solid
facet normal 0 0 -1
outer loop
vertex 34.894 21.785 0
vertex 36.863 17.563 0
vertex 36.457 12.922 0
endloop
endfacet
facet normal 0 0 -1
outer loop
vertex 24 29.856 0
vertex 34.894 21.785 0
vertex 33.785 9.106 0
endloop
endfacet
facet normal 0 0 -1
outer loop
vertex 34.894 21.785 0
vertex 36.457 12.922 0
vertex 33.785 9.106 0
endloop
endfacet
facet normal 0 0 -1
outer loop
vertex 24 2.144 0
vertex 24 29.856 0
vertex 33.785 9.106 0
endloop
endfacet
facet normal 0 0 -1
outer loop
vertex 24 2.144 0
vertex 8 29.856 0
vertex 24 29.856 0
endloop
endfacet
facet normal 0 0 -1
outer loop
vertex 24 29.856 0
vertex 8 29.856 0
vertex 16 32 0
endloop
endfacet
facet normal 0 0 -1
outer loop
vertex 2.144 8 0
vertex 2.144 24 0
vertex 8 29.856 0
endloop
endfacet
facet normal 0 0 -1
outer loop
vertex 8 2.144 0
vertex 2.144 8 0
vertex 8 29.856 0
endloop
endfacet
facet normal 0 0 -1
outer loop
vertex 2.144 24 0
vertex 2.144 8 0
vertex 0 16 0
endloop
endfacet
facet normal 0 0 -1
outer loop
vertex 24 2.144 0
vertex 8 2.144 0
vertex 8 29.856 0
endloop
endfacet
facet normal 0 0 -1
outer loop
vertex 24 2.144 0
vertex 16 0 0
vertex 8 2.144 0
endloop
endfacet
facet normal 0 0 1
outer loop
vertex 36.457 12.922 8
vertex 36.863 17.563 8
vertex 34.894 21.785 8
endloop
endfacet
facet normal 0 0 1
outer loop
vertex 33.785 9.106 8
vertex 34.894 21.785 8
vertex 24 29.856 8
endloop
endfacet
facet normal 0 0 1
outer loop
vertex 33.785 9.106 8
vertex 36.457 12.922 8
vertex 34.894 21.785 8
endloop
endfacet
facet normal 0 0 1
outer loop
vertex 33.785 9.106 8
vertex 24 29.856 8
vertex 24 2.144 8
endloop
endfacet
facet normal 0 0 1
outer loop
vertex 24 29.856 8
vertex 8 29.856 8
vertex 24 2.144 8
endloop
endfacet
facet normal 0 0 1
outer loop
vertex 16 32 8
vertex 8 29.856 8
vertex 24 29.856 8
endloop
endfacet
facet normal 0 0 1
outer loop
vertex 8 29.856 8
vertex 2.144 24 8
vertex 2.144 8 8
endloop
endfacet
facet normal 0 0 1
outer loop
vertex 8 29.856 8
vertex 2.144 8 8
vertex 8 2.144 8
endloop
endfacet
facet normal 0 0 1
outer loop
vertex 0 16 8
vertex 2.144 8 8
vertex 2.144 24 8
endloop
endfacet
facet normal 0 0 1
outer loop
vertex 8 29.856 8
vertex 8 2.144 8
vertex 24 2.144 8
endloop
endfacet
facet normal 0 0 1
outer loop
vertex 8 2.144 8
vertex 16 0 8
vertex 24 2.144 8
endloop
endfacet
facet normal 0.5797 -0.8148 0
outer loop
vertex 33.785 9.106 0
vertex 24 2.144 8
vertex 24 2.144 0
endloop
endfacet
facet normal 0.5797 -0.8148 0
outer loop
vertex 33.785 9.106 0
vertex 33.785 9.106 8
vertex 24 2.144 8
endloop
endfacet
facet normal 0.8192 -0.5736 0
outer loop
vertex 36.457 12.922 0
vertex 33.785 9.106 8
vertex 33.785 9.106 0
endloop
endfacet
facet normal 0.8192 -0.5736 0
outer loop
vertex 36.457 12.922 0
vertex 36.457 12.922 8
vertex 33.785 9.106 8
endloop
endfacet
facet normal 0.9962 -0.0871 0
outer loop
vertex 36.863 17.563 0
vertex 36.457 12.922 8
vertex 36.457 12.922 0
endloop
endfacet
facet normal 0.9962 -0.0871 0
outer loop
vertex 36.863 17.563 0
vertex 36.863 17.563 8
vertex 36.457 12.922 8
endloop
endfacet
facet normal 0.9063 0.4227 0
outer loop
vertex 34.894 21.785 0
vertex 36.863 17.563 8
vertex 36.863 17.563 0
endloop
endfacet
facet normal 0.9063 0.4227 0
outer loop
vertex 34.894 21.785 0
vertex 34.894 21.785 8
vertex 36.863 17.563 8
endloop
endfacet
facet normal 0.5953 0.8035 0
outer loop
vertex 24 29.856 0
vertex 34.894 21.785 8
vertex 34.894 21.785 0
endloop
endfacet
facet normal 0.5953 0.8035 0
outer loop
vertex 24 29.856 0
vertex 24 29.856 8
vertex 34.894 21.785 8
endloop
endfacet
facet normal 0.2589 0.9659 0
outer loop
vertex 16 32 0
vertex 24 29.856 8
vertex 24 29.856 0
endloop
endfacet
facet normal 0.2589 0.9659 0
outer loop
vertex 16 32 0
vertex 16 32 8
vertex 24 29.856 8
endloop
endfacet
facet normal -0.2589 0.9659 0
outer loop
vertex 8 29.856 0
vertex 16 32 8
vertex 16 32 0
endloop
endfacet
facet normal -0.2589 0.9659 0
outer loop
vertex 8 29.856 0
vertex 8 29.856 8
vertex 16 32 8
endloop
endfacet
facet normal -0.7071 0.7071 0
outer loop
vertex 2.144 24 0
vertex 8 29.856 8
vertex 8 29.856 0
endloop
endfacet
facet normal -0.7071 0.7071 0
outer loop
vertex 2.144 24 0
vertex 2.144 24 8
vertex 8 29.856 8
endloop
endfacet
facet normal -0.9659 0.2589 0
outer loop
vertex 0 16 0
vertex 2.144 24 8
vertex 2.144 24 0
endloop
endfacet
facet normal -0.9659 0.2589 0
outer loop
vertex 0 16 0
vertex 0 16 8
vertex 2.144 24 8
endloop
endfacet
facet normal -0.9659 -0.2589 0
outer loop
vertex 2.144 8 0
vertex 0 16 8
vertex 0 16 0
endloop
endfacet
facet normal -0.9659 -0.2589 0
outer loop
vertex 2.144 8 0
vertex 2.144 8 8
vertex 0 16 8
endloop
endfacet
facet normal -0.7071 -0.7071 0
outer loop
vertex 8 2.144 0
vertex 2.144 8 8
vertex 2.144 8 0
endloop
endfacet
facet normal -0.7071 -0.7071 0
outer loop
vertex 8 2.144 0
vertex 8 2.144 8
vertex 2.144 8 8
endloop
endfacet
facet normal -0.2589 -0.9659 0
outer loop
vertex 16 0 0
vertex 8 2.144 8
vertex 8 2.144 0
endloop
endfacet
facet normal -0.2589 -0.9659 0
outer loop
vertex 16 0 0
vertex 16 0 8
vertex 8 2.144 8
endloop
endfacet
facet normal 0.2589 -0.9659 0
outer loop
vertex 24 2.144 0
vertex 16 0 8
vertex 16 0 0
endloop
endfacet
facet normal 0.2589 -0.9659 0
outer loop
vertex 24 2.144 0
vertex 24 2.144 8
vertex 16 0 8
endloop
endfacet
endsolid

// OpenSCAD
$fn = 32;

// ----------------------------------------------------------------------
// Eccentric disc: step, 8 mm thick
// ----------------------------------------------------------------------

// --- parameters (mm) ---
profile_height = 8;       // extrusion height
profile_points = 13;      // points of the closed outline

profile = [[0, 16], [2.144, 8], [8, 2.144], [16, 0], [24, 2.144], [33.785, 9.106], [36.457, 12.922], [36.863, 17.563], [34.894, 21.785], [24, 29.856], [16, 32], [8, 29.856], [2.144, 24]];  // single closed polygon, 13 points, counter clockwise

// --- the one profile operation ---
linear_extrude(height = profile_height) polygon(points = profile);
